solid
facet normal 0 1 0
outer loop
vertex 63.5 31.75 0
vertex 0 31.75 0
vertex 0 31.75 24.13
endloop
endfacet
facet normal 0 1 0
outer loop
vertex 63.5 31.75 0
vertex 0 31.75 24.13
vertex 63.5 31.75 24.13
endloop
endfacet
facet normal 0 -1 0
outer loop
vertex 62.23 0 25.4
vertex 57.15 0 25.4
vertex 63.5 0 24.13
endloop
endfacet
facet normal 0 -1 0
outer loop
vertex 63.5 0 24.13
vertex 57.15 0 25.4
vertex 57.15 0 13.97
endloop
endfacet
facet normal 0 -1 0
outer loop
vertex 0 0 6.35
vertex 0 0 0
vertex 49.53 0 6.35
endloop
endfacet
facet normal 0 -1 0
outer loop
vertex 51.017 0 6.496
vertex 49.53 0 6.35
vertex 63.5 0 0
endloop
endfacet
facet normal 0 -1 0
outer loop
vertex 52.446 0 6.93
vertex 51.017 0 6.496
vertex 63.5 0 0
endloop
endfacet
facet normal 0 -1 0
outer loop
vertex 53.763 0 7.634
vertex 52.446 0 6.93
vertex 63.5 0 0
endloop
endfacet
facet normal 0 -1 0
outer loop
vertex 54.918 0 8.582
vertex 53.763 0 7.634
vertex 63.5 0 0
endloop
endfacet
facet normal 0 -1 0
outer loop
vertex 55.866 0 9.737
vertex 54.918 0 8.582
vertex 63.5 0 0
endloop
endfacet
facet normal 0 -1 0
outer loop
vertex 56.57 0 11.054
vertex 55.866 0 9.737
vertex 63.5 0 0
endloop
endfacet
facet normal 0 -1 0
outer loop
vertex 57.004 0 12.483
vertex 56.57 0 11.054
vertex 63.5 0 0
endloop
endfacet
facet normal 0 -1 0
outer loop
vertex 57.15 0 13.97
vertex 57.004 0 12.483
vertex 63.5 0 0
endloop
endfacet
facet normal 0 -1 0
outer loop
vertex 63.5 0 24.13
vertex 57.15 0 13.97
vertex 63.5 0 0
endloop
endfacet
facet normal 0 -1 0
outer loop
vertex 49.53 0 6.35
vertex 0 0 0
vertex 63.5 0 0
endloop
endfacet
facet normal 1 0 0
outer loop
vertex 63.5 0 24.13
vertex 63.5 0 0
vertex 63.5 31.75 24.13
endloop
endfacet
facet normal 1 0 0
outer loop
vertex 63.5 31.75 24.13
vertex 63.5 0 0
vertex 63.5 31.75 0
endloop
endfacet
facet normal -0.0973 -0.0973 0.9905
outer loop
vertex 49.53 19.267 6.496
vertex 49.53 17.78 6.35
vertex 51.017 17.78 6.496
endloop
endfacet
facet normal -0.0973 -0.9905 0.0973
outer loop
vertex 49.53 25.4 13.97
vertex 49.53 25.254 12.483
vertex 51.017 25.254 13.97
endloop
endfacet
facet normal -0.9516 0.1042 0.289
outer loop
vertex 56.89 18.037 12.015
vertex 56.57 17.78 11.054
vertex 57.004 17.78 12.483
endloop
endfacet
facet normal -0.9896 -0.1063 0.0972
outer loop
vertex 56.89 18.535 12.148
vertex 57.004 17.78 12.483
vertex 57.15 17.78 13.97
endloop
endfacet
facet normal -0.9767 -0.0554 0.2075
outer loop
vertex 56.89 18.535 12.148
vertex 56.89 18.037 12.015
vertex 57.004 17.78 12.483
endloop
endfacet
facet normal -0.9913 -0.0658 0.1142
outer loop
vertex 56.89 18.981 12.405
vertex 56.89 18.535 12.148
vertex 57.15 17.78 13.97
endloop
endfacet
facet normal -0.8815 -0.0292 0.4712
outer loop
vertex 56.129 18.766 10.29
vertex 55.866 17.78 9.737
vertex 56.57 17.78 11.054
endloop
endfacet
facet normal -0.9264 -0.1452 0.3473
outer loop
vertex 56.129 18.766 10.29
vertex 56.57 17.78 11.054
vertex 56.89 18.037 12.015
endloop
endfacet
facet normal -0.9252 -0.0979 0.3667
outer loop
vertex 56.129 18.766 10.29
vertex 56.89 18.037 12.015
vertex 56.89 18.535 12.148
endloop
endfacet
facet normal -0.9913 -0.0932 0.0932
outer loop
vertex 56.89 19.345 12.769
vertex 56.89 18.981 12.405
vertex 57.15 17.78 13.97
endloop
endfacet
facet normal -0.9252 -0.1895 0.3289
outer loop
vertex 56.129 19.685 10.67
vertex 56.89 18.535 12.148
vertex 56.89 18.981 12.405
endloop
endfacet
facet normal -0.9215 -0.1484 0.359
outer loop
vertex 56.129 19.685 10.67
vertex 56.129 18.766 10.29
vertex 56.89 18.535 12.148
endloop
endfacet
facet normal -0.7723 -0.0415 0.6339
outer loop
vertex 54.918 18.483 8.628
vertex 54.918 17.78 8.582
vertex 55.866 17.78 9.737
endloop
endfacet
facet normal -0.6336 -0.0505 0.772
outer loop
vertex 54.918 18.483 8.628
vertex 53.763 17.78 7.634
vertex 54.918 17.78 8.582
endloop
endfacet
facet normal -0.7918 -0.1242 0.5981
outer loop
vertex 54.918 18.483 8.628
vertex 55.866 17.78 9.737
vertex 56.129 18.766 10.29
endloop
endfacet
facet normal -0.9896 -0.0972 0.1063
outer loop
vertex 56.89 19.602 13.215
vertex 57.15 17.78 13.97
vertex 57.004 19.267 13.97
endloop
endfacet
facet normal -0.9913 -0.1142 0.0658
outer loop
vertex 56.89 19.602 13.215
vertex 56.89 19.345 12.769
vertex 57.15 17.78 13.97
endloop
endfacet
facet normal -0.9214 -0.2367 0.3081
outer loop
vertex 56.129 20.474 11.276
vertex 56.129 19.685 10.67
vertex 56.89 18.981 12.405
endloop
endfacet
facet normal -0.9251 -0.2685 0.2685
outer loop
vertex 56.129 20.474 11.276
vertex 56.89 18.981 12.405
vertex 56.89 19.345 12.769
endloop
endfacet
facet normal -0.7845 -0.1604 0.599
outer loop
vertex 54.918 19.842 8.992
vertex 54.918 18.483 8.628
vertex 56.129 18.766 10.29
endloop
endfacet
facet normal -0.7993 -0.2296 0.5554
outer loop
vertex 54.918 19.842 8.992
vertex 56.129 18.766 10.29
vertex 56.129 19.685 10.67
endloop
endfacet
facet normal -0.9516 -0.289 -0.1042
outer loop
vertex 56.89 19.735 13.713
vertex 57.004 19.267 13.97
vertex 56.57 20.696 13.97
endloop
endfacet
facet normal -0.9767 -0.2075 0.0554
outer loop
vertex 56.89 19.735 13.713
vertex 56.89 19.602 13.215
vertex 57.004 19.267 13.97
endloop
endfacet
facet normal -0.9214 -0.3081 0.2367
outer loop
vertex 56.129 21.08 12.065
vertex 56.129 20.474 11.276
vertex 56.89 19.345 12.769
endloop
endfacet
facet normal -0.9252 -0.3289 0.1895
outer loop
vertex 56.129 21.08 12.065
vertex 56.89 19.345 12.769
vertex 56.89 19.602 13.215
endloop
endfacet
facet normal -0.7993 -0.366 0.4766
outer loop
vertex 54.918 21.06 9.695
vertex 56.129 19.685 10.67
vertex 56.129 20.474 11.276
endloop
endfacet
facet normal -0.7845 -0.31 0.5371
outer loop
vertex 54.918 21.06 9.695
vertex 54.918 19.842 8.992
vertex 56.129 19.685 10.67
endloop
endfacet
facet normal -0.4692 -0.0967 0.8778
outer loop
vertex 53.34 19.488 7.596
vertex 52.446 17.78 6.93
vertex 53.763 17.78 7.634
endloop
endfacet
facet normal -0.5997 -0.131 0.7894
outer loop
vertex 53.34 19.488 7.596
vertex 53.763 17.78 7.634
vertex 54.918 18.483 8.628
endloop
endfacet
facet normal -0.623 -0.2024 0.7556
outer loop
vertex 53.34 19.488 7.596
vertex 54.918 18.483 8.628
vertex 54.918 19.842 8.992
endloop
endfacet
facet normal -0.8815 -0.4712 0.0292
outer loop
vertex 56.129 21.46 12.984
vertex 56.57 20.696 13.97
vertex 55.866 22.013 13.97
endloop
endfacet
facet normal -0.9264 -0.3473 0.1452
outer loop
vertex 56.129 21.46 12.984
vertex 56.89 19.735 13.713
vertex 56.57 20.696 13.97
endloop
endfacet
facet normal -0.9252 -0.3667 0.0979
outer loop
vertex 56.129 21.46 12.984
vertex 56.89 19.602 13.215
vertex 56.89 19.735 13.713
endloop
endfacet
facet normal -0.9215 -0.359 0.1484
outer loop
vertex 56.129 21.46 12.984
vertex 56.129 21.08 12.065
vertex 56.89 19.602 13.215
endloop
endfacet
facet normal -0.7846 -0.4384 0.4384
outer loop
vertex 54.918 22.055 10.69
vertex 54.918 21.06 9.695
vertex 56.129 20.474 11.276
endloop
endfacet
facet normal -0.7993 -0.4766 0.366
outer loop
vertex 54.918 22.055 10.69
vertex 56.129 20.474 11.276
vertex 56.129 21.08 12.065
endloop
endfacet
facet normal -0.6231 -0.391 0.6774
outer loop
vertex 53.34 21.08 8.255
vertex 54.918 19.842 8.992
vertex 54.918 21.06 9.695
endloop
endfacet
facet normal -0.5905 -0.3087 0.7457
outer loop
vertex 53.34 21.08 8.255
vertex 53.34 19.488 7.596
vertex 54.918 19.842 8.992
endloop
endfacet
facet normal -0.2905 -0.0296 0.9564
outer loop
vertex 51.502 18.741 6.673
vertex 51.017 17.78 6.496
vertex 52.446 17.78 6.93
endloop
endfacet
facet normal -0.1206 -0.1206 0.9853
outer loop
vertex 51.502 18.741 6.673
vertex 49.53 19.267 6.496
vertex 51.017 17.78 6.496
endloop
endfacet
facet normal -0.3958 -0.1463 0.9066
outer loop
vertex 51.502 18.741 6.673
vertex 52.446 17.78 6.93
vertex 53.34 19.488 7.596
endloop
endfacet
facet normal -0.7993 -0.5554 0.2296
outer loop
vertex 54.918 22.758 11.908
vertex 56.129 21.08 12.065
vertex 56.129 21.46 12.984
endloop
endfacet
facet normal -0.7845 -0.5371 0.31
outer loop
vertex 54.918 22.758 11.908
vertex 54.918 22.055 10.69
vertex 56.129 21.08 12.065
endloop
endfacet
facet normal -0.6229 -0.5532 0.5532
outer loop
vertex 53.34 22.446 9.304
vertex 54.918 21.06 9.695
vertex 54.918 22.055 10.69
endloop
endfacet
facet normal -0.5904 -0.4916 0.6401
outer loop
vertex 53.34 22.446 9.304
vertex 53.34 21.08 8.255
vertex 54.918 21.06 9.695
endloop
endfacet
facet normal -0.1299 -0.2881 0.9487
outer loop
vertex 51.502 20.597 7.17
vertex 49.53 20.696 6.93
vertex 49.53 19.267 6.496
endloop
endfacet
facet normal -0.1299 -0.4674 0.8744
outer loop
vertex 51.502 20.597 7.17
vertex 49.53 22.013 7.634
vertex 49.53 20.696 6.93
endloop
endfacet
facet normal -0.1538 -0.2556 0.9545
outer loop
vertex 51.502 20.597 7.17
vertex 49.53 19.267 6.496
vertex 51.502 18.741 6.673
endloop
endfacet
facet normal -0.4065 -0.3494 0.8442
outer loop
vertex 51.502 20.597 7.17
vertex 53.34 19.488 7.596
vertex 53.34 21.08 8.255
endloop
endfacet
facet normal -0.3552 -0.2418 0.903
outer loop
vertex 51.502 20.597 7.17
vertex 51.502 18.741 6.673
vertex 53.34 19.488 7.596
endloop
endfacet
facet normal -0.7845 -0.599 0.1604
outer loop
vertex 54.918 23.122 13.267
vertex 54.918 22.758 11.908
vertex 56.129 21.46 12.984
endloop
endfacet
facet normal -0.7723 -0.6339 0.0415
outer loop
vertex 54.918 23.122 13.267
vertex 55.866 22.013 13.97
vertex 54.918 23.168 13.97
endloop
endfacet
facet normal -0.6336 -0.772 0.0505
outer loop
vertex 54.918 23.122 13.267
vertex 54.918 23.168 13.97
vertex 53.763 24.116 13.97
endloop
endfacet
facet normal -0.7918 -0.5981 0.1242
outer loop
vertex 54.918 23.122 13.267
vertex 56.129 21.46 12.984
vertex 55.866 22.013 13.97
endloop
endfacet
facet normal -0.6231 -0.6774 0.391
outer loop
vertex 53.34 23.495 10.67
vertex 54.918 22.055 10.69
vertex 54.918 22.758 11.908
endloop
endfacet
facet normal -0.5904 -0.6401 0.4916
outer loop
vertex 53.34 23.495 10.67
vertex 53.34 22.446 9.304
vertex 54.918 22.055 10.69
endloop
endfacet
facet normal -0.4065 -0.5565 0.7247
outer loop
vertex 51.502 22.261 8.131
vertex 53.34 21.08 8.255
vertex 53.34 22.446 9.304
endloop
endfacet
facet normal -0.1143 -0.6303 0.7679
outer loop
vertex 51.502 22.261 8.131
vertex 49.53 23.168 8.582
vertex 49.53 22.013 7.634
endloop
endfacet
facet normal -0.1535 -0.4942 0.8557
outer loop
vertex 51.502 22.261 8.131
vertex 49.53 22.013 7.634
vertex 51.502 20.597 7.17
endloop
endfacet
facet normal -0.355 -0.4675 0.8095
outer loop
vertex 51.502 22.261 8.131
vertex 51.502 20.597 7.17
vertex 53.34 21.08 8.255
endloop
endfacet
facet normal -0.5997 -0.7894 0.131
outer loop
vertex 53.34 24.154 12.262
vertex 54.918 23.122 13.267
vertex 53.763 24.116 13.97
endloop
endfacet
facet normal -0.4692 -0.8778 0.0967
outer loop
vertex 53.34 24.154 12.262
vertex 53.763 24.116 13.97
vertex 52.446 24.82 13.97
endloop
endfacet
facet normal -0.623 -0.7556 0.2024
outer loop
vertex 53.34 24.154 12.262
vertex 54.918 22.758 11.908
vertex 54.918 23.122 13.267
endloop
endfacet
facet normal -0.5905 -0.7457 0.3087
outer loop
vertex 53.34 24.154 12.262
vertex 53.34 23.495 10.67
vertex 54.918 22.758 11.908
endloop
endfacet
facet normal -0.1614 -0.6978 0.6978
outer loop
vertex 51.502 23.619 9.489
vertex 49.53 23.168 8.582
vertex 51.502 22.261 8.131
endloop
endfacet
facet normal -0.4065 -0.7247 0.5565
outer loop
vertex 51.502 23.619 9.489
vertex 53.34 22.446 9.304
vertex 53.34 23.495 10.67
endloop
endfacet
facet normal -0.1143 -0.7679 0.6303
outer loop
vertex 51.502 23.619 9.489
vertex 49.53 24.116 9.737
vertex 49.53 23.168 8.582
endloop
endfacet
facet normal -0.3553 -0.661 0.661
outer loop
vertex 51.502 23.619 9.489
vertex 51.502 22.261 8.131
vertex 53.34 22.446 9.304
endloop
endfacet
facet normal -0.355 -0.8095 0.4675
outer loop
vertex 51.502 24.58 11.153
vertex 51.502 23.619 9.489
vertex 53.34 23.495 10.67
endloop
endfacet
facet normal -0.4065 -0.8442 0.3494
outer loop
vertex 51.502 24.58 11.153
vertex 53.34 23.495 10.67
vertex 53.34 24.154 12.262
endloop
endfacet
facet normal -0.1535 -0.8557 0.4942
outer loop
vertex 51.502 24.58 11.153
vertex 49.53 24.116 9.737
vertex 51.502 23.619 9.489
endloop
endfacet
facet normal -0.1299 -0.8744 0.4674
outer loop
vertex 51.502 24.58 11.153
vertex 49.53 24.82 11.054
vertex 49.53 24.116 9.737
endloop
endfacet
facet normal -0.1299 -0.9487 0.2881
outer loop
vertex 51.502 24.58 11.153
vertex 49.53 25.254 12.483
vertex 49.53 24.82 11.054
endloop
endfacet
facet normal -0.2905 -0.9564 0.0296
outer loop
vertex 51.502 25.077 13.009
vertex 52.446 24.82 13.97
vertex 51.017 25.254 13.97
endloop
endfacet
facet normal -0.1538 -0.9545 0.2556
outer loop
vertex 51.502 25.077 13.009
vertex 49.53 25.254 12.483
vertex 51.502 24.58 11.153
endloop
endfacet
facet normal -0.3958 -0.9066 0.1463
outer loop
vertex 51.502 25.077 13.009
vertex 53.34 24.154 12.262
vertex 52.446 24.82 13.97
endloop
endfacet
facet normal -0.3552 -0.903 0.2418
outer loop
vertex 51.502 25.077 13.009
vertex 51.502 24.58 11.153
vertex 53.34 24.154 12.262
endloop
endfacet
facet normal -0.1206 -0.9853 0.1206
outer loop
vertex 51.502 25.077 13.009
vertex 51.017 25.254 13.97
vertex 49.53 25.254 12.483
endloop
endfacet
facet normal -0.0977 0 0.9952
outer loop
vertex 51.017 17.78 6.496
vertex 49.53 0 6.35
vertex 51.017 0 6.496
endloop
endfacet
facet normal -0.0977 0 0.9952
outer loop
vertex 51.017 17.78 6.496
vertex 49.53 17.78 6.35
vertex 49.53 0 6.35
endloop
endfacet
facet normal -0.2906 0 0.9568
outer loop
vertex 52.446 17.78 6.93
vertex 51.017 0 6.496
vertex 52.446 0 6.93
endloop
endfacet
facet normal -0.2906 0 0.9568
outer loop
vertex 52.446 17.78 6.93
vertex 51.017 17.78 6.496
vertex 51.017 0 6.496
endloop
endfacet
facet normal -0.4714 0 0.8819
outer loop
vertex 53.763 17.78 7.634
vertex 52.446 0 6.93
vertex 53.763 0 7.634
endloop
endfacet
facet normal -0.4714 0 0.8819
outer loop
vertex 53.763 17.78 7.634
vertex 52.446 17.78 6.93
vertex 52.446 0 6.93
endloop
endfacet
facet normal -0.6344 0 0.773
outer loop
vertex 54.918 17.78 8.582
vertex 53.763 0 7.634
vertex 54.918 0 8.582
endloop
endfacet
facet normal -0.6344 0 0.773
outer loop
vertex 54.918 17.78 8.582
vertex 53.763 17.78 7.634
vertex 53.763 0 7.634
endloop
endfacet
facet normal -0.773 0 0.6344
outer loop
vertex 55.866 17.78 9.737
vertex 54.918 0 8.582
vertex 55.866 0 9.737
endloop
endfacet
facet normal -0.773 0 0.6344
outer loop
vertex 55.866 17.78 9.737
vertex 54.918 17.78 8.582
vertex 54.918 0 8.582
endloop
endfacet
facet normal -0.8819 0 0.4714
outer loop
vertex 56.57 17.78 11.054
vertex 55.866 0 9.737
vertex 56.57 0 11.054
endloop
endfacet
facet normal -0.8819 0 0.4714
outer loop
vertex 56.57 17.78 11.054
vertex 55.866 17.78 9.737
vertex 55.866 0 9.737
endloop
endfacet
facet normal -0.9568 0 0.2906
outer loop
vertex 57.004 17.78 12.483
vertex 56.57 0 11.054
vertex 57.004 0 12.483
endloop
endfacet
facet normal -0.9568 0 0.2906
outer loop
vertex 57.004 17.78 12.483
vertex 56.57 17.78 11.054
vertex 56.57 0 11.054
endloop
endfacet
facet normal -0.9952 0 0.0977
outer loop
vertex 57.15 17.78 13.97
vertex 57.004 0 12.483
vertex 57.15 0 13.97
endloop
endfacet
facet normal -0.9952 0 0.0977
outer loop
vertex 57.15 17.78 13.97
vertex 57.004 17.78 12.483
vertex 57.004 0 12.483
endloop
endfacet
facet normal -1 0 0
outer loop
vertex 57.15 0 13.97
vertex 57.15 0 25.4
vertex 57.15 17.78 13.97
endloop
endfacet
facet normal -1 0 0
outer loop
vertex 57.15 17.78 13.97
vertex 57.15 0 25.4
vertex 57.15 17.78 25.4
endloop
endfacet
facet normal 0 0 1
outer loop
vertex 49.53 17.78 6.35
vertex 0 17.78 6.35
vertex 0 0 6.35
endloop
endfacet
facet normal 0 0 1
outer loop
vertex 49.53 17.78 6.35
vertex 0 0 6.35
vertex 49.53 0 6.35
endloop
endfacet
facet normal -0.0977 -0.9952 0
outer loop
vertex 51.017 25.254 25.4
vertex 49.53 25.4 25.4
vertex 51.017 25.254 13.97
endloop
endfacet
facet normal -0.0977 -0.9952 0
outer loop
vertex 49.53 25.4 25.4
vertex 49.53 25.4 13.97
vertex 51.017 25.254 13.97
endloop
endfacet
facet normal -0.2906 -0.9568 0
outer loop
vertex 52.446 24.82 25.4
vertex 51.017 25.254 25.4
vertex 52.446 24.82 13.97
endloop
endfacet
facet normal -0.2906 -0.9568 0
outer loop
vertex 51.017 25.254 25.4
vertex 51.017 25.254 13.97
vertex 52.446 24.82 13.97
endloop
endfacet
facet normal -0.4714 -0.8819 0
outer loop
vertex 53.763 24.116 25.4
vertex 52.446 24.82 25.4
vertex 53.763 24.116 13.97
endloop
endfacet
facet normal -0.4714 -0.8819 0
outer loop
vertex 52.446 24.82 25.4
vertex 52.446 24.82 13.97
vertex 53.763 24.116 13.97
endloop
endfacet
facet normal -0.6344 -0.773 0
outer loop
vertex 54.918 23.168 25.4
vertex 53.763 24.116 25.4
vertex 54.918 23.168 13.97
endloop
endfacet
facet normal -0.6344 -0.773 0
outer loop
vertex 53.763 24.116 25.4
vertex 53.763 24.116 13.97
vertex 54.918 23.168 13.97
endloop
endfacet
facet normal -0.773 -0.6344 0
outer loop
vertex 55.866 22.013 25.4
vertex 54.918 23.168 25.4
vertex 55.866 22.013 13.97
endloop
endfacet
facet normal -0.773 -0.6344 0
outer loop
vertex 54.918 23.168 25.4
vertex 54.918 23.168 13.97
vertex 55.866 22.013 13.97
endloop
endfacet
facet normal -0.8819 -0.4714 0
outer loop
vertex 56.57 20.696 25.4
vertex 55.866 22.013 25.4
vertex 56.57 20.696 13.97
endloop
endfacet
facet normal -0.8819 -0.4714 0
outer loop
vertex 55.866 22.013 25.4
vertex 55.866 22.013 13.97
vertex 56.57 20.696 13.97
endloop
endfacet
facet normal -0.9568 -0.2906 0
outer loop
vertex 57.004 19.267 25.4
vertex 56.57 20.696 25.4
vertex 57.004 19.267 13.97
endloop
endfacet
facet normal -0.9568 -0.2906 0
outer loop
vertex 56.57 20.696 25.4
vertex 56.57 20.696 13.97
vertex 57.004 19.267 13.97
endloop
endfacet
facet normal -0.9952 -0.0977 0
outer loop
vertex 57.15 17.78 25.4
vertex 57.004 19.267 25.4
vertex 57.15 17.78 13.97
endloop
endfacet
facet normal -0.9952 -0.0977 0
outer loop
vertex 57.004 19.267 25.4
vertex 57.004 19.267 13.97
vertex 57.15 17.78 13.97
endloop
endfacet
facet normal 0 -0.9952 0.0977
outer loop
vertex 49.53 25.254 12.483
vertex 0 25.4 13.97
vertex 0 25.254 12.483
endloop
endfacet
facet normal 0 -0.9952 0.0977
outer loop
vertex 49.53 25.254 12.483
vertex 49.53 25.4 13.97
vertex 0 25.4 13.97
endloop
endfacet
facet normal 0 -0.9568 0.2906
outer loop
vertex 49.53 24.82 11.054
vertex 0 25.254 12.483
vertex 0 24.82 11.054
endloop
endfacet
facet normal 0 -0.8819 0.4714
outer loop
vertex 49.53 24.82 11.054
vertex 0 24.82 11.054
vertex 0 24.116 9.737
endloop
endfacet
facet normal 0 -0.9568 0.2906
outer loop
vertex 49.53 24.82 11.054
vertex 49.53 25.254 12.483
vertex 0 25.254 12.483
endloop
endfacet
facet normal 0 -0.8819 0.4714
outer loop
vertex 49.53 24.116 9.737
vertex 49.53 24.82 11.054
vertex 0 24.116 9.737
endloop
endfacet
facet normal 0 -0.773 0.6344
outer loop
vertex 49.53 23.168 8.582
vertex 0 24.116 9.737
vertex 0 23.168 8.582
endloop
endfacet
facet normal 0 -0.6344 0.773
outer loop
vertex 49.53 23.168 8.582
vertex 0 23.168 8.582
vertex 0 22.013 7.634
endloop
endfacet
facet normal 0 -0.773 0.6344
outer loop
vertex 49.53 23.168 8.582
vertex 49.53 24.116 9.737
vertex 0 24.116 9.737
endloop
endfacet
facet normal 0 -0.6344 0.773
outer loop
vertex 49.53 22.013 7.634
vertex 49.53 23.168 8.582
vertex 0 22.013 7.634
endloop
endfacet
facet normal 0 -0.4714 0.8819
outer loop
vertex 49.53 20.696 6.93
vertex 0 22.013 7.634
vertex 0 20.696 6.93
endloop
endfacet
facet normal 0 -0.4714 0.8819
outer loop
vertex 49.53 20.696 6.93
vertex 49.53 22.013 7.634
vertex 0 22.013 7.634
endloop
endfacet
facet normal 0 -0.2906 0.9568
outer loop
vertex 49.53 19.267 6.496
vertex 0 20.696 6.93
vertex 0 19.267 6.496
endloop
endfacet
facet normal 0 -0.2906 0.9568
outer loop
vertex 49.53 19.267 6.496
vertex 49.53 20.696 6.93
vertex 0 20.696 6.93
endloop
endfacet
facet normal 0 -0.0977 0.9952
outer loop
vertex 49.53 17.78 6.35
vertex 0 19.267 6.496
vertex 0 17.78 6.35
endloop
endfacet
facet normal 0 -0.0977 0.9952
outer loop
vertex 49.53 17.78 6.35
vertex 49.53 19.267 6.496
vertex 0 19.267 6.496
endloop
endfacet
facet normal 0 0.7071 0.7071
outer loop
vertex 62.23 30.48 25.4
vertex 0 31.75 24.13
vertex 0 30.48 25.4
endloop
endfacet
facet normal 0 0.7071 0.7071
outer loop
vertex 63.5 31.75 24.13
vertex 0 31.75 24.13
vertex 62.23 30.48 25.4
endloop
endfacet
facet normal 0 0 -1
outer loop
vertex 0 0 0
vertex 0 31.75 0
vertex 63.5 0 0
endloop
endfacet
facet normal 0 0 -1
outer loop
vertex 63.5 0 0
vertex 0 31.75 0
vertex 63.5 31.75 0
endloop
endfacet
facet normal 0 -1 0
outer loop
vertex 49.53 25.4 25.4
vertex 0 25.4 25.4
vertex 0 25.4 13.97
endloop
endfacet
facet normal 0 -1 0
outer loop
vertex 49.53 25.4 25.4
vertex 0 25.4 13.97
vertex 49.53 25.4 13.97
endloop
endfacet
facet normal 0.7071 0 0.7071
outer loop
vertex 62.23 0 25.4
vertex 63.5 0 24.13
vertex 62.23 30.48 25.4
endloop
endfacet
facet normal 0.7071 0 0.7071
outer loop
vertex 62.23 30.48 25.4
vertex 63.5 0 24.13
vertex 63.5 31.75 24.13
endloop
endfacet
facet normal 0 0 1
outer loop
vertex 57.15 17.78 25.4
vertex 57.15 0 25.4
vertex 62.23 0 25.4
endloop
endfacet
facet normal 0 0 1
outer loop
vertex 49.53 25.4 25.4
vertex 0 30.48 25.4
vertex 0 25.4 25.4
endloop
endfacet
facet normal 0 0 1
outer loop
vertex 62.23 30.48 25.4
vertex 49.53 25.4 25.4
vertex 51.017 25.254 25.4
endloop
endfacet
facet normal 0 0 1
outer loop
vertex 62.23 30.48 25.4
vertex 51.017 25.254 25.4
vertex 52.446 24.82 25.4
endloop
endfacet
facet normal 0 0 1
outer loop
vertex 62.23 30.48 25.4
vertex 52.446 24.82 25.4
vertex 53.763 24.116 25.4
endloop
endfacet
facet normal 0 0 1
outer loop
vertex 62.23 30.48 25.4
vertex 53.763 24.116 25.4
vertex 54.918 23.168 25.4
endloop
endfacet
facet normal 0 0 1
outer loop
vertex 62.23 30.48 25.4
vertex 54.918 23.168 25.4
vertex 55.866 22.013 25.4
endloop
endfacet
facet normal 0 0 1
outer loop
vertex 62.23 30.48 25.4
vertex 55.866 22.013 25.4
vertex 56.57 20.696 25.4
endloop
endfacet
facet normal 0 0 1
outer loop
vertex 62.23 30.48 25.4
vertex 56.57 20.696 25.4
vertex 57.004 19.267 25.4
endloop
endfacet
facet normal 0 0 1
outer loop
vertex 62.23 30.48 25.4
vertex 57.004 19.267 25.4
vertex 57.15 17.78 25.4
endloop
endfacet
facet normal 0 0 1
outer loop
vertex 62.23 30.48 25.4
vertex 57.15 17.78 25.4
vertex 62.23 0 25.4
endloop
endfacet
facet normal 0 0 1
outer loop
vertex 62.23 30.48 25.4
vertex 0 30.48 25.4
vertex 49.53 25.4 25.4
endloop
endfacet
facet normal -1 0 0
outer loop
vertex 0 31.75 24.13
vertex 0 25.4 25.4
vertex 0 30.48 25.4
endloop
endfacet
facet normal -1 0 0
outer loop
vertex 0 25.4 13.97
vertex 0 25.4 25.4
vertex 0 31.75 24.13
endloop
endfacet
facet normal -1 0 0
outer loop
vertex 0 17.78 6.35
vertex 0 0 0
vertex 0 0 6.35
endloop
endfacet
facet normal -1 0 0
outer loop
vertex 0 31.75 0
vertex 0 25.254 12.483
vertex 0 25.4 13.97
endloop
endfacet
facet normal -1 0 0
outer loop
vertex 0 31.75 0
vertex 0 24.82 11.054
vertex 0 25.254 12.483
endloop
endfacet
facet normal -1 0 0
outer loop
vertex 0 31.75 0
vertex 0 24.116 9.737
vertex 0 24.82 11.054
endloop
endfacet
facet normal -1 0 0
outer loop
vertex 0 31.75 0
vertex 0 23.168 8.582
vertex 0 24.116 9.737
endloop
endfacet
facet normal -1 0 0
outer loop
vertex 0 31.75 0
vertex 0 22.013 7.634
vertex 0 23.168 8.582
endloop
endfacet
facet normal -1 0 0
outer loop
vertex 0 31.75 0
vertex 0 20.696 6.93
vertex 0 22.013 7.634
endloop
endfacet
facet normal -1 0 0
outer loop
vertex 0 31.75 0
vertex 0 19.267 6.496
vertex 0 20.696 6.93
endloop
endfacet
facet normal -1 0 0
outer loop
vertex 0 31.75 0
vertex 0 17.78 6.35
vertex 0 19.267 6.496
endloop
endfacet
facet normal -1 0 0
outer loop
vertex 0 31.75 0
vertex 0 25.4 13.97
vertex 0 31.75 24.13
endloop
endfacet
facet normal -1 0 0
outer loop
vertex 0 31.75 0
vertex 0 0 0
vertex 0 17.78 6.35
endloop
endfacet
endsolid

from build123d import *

# Parameters (mm, degrees)
F0_W     = 63.5
F0_H     = 31.75
F1_DEPTH = 25.4
F2_W     = 57.15
F2_H     = 25.4
F3_DEPTH = 19.05
F4_R     = 7.62
F5_SIZE  = 1.27


with BuildPart() as f1:
    # F0 (on Top) → F1 (new body)
    with BuildSketch(Plane.XY):
        with Locations((31.75, 15.875)):
            Rectangle(F0_W, F0_H)
    extrude(amount=F1_DEPTH)

    # F2 (on face) → F3 (cut)
    with BuildSketch(Plane.XY.offset(25.4)):
        with Locations((28.575, 12.7)):
            Rectangle(F2_W, F2_H)
    extrude(amount=-F3_DEPTH, mode=Mode.SUBTRACT)

    # F4
    f4_edges = [f1.edges().sort_by_distance(p)[0] for p in [
        (28.575, 25.4, 6.35),
        (57.15, 12.7, 6.35),
        (57.15, 25.4, 15.875),
    ]]
    fillet(f4_edges, radius=F4_R)

    # F5
    f5_edges = [f1.edges().sort_by_distance(p)[0] for p in [
        (63.5, 15.875, 25.4),
        (31.75, 31.75, 25.4),
    ]]
    chamfer(f5_edges, length=F5_SIZE)


solid = f1.part
